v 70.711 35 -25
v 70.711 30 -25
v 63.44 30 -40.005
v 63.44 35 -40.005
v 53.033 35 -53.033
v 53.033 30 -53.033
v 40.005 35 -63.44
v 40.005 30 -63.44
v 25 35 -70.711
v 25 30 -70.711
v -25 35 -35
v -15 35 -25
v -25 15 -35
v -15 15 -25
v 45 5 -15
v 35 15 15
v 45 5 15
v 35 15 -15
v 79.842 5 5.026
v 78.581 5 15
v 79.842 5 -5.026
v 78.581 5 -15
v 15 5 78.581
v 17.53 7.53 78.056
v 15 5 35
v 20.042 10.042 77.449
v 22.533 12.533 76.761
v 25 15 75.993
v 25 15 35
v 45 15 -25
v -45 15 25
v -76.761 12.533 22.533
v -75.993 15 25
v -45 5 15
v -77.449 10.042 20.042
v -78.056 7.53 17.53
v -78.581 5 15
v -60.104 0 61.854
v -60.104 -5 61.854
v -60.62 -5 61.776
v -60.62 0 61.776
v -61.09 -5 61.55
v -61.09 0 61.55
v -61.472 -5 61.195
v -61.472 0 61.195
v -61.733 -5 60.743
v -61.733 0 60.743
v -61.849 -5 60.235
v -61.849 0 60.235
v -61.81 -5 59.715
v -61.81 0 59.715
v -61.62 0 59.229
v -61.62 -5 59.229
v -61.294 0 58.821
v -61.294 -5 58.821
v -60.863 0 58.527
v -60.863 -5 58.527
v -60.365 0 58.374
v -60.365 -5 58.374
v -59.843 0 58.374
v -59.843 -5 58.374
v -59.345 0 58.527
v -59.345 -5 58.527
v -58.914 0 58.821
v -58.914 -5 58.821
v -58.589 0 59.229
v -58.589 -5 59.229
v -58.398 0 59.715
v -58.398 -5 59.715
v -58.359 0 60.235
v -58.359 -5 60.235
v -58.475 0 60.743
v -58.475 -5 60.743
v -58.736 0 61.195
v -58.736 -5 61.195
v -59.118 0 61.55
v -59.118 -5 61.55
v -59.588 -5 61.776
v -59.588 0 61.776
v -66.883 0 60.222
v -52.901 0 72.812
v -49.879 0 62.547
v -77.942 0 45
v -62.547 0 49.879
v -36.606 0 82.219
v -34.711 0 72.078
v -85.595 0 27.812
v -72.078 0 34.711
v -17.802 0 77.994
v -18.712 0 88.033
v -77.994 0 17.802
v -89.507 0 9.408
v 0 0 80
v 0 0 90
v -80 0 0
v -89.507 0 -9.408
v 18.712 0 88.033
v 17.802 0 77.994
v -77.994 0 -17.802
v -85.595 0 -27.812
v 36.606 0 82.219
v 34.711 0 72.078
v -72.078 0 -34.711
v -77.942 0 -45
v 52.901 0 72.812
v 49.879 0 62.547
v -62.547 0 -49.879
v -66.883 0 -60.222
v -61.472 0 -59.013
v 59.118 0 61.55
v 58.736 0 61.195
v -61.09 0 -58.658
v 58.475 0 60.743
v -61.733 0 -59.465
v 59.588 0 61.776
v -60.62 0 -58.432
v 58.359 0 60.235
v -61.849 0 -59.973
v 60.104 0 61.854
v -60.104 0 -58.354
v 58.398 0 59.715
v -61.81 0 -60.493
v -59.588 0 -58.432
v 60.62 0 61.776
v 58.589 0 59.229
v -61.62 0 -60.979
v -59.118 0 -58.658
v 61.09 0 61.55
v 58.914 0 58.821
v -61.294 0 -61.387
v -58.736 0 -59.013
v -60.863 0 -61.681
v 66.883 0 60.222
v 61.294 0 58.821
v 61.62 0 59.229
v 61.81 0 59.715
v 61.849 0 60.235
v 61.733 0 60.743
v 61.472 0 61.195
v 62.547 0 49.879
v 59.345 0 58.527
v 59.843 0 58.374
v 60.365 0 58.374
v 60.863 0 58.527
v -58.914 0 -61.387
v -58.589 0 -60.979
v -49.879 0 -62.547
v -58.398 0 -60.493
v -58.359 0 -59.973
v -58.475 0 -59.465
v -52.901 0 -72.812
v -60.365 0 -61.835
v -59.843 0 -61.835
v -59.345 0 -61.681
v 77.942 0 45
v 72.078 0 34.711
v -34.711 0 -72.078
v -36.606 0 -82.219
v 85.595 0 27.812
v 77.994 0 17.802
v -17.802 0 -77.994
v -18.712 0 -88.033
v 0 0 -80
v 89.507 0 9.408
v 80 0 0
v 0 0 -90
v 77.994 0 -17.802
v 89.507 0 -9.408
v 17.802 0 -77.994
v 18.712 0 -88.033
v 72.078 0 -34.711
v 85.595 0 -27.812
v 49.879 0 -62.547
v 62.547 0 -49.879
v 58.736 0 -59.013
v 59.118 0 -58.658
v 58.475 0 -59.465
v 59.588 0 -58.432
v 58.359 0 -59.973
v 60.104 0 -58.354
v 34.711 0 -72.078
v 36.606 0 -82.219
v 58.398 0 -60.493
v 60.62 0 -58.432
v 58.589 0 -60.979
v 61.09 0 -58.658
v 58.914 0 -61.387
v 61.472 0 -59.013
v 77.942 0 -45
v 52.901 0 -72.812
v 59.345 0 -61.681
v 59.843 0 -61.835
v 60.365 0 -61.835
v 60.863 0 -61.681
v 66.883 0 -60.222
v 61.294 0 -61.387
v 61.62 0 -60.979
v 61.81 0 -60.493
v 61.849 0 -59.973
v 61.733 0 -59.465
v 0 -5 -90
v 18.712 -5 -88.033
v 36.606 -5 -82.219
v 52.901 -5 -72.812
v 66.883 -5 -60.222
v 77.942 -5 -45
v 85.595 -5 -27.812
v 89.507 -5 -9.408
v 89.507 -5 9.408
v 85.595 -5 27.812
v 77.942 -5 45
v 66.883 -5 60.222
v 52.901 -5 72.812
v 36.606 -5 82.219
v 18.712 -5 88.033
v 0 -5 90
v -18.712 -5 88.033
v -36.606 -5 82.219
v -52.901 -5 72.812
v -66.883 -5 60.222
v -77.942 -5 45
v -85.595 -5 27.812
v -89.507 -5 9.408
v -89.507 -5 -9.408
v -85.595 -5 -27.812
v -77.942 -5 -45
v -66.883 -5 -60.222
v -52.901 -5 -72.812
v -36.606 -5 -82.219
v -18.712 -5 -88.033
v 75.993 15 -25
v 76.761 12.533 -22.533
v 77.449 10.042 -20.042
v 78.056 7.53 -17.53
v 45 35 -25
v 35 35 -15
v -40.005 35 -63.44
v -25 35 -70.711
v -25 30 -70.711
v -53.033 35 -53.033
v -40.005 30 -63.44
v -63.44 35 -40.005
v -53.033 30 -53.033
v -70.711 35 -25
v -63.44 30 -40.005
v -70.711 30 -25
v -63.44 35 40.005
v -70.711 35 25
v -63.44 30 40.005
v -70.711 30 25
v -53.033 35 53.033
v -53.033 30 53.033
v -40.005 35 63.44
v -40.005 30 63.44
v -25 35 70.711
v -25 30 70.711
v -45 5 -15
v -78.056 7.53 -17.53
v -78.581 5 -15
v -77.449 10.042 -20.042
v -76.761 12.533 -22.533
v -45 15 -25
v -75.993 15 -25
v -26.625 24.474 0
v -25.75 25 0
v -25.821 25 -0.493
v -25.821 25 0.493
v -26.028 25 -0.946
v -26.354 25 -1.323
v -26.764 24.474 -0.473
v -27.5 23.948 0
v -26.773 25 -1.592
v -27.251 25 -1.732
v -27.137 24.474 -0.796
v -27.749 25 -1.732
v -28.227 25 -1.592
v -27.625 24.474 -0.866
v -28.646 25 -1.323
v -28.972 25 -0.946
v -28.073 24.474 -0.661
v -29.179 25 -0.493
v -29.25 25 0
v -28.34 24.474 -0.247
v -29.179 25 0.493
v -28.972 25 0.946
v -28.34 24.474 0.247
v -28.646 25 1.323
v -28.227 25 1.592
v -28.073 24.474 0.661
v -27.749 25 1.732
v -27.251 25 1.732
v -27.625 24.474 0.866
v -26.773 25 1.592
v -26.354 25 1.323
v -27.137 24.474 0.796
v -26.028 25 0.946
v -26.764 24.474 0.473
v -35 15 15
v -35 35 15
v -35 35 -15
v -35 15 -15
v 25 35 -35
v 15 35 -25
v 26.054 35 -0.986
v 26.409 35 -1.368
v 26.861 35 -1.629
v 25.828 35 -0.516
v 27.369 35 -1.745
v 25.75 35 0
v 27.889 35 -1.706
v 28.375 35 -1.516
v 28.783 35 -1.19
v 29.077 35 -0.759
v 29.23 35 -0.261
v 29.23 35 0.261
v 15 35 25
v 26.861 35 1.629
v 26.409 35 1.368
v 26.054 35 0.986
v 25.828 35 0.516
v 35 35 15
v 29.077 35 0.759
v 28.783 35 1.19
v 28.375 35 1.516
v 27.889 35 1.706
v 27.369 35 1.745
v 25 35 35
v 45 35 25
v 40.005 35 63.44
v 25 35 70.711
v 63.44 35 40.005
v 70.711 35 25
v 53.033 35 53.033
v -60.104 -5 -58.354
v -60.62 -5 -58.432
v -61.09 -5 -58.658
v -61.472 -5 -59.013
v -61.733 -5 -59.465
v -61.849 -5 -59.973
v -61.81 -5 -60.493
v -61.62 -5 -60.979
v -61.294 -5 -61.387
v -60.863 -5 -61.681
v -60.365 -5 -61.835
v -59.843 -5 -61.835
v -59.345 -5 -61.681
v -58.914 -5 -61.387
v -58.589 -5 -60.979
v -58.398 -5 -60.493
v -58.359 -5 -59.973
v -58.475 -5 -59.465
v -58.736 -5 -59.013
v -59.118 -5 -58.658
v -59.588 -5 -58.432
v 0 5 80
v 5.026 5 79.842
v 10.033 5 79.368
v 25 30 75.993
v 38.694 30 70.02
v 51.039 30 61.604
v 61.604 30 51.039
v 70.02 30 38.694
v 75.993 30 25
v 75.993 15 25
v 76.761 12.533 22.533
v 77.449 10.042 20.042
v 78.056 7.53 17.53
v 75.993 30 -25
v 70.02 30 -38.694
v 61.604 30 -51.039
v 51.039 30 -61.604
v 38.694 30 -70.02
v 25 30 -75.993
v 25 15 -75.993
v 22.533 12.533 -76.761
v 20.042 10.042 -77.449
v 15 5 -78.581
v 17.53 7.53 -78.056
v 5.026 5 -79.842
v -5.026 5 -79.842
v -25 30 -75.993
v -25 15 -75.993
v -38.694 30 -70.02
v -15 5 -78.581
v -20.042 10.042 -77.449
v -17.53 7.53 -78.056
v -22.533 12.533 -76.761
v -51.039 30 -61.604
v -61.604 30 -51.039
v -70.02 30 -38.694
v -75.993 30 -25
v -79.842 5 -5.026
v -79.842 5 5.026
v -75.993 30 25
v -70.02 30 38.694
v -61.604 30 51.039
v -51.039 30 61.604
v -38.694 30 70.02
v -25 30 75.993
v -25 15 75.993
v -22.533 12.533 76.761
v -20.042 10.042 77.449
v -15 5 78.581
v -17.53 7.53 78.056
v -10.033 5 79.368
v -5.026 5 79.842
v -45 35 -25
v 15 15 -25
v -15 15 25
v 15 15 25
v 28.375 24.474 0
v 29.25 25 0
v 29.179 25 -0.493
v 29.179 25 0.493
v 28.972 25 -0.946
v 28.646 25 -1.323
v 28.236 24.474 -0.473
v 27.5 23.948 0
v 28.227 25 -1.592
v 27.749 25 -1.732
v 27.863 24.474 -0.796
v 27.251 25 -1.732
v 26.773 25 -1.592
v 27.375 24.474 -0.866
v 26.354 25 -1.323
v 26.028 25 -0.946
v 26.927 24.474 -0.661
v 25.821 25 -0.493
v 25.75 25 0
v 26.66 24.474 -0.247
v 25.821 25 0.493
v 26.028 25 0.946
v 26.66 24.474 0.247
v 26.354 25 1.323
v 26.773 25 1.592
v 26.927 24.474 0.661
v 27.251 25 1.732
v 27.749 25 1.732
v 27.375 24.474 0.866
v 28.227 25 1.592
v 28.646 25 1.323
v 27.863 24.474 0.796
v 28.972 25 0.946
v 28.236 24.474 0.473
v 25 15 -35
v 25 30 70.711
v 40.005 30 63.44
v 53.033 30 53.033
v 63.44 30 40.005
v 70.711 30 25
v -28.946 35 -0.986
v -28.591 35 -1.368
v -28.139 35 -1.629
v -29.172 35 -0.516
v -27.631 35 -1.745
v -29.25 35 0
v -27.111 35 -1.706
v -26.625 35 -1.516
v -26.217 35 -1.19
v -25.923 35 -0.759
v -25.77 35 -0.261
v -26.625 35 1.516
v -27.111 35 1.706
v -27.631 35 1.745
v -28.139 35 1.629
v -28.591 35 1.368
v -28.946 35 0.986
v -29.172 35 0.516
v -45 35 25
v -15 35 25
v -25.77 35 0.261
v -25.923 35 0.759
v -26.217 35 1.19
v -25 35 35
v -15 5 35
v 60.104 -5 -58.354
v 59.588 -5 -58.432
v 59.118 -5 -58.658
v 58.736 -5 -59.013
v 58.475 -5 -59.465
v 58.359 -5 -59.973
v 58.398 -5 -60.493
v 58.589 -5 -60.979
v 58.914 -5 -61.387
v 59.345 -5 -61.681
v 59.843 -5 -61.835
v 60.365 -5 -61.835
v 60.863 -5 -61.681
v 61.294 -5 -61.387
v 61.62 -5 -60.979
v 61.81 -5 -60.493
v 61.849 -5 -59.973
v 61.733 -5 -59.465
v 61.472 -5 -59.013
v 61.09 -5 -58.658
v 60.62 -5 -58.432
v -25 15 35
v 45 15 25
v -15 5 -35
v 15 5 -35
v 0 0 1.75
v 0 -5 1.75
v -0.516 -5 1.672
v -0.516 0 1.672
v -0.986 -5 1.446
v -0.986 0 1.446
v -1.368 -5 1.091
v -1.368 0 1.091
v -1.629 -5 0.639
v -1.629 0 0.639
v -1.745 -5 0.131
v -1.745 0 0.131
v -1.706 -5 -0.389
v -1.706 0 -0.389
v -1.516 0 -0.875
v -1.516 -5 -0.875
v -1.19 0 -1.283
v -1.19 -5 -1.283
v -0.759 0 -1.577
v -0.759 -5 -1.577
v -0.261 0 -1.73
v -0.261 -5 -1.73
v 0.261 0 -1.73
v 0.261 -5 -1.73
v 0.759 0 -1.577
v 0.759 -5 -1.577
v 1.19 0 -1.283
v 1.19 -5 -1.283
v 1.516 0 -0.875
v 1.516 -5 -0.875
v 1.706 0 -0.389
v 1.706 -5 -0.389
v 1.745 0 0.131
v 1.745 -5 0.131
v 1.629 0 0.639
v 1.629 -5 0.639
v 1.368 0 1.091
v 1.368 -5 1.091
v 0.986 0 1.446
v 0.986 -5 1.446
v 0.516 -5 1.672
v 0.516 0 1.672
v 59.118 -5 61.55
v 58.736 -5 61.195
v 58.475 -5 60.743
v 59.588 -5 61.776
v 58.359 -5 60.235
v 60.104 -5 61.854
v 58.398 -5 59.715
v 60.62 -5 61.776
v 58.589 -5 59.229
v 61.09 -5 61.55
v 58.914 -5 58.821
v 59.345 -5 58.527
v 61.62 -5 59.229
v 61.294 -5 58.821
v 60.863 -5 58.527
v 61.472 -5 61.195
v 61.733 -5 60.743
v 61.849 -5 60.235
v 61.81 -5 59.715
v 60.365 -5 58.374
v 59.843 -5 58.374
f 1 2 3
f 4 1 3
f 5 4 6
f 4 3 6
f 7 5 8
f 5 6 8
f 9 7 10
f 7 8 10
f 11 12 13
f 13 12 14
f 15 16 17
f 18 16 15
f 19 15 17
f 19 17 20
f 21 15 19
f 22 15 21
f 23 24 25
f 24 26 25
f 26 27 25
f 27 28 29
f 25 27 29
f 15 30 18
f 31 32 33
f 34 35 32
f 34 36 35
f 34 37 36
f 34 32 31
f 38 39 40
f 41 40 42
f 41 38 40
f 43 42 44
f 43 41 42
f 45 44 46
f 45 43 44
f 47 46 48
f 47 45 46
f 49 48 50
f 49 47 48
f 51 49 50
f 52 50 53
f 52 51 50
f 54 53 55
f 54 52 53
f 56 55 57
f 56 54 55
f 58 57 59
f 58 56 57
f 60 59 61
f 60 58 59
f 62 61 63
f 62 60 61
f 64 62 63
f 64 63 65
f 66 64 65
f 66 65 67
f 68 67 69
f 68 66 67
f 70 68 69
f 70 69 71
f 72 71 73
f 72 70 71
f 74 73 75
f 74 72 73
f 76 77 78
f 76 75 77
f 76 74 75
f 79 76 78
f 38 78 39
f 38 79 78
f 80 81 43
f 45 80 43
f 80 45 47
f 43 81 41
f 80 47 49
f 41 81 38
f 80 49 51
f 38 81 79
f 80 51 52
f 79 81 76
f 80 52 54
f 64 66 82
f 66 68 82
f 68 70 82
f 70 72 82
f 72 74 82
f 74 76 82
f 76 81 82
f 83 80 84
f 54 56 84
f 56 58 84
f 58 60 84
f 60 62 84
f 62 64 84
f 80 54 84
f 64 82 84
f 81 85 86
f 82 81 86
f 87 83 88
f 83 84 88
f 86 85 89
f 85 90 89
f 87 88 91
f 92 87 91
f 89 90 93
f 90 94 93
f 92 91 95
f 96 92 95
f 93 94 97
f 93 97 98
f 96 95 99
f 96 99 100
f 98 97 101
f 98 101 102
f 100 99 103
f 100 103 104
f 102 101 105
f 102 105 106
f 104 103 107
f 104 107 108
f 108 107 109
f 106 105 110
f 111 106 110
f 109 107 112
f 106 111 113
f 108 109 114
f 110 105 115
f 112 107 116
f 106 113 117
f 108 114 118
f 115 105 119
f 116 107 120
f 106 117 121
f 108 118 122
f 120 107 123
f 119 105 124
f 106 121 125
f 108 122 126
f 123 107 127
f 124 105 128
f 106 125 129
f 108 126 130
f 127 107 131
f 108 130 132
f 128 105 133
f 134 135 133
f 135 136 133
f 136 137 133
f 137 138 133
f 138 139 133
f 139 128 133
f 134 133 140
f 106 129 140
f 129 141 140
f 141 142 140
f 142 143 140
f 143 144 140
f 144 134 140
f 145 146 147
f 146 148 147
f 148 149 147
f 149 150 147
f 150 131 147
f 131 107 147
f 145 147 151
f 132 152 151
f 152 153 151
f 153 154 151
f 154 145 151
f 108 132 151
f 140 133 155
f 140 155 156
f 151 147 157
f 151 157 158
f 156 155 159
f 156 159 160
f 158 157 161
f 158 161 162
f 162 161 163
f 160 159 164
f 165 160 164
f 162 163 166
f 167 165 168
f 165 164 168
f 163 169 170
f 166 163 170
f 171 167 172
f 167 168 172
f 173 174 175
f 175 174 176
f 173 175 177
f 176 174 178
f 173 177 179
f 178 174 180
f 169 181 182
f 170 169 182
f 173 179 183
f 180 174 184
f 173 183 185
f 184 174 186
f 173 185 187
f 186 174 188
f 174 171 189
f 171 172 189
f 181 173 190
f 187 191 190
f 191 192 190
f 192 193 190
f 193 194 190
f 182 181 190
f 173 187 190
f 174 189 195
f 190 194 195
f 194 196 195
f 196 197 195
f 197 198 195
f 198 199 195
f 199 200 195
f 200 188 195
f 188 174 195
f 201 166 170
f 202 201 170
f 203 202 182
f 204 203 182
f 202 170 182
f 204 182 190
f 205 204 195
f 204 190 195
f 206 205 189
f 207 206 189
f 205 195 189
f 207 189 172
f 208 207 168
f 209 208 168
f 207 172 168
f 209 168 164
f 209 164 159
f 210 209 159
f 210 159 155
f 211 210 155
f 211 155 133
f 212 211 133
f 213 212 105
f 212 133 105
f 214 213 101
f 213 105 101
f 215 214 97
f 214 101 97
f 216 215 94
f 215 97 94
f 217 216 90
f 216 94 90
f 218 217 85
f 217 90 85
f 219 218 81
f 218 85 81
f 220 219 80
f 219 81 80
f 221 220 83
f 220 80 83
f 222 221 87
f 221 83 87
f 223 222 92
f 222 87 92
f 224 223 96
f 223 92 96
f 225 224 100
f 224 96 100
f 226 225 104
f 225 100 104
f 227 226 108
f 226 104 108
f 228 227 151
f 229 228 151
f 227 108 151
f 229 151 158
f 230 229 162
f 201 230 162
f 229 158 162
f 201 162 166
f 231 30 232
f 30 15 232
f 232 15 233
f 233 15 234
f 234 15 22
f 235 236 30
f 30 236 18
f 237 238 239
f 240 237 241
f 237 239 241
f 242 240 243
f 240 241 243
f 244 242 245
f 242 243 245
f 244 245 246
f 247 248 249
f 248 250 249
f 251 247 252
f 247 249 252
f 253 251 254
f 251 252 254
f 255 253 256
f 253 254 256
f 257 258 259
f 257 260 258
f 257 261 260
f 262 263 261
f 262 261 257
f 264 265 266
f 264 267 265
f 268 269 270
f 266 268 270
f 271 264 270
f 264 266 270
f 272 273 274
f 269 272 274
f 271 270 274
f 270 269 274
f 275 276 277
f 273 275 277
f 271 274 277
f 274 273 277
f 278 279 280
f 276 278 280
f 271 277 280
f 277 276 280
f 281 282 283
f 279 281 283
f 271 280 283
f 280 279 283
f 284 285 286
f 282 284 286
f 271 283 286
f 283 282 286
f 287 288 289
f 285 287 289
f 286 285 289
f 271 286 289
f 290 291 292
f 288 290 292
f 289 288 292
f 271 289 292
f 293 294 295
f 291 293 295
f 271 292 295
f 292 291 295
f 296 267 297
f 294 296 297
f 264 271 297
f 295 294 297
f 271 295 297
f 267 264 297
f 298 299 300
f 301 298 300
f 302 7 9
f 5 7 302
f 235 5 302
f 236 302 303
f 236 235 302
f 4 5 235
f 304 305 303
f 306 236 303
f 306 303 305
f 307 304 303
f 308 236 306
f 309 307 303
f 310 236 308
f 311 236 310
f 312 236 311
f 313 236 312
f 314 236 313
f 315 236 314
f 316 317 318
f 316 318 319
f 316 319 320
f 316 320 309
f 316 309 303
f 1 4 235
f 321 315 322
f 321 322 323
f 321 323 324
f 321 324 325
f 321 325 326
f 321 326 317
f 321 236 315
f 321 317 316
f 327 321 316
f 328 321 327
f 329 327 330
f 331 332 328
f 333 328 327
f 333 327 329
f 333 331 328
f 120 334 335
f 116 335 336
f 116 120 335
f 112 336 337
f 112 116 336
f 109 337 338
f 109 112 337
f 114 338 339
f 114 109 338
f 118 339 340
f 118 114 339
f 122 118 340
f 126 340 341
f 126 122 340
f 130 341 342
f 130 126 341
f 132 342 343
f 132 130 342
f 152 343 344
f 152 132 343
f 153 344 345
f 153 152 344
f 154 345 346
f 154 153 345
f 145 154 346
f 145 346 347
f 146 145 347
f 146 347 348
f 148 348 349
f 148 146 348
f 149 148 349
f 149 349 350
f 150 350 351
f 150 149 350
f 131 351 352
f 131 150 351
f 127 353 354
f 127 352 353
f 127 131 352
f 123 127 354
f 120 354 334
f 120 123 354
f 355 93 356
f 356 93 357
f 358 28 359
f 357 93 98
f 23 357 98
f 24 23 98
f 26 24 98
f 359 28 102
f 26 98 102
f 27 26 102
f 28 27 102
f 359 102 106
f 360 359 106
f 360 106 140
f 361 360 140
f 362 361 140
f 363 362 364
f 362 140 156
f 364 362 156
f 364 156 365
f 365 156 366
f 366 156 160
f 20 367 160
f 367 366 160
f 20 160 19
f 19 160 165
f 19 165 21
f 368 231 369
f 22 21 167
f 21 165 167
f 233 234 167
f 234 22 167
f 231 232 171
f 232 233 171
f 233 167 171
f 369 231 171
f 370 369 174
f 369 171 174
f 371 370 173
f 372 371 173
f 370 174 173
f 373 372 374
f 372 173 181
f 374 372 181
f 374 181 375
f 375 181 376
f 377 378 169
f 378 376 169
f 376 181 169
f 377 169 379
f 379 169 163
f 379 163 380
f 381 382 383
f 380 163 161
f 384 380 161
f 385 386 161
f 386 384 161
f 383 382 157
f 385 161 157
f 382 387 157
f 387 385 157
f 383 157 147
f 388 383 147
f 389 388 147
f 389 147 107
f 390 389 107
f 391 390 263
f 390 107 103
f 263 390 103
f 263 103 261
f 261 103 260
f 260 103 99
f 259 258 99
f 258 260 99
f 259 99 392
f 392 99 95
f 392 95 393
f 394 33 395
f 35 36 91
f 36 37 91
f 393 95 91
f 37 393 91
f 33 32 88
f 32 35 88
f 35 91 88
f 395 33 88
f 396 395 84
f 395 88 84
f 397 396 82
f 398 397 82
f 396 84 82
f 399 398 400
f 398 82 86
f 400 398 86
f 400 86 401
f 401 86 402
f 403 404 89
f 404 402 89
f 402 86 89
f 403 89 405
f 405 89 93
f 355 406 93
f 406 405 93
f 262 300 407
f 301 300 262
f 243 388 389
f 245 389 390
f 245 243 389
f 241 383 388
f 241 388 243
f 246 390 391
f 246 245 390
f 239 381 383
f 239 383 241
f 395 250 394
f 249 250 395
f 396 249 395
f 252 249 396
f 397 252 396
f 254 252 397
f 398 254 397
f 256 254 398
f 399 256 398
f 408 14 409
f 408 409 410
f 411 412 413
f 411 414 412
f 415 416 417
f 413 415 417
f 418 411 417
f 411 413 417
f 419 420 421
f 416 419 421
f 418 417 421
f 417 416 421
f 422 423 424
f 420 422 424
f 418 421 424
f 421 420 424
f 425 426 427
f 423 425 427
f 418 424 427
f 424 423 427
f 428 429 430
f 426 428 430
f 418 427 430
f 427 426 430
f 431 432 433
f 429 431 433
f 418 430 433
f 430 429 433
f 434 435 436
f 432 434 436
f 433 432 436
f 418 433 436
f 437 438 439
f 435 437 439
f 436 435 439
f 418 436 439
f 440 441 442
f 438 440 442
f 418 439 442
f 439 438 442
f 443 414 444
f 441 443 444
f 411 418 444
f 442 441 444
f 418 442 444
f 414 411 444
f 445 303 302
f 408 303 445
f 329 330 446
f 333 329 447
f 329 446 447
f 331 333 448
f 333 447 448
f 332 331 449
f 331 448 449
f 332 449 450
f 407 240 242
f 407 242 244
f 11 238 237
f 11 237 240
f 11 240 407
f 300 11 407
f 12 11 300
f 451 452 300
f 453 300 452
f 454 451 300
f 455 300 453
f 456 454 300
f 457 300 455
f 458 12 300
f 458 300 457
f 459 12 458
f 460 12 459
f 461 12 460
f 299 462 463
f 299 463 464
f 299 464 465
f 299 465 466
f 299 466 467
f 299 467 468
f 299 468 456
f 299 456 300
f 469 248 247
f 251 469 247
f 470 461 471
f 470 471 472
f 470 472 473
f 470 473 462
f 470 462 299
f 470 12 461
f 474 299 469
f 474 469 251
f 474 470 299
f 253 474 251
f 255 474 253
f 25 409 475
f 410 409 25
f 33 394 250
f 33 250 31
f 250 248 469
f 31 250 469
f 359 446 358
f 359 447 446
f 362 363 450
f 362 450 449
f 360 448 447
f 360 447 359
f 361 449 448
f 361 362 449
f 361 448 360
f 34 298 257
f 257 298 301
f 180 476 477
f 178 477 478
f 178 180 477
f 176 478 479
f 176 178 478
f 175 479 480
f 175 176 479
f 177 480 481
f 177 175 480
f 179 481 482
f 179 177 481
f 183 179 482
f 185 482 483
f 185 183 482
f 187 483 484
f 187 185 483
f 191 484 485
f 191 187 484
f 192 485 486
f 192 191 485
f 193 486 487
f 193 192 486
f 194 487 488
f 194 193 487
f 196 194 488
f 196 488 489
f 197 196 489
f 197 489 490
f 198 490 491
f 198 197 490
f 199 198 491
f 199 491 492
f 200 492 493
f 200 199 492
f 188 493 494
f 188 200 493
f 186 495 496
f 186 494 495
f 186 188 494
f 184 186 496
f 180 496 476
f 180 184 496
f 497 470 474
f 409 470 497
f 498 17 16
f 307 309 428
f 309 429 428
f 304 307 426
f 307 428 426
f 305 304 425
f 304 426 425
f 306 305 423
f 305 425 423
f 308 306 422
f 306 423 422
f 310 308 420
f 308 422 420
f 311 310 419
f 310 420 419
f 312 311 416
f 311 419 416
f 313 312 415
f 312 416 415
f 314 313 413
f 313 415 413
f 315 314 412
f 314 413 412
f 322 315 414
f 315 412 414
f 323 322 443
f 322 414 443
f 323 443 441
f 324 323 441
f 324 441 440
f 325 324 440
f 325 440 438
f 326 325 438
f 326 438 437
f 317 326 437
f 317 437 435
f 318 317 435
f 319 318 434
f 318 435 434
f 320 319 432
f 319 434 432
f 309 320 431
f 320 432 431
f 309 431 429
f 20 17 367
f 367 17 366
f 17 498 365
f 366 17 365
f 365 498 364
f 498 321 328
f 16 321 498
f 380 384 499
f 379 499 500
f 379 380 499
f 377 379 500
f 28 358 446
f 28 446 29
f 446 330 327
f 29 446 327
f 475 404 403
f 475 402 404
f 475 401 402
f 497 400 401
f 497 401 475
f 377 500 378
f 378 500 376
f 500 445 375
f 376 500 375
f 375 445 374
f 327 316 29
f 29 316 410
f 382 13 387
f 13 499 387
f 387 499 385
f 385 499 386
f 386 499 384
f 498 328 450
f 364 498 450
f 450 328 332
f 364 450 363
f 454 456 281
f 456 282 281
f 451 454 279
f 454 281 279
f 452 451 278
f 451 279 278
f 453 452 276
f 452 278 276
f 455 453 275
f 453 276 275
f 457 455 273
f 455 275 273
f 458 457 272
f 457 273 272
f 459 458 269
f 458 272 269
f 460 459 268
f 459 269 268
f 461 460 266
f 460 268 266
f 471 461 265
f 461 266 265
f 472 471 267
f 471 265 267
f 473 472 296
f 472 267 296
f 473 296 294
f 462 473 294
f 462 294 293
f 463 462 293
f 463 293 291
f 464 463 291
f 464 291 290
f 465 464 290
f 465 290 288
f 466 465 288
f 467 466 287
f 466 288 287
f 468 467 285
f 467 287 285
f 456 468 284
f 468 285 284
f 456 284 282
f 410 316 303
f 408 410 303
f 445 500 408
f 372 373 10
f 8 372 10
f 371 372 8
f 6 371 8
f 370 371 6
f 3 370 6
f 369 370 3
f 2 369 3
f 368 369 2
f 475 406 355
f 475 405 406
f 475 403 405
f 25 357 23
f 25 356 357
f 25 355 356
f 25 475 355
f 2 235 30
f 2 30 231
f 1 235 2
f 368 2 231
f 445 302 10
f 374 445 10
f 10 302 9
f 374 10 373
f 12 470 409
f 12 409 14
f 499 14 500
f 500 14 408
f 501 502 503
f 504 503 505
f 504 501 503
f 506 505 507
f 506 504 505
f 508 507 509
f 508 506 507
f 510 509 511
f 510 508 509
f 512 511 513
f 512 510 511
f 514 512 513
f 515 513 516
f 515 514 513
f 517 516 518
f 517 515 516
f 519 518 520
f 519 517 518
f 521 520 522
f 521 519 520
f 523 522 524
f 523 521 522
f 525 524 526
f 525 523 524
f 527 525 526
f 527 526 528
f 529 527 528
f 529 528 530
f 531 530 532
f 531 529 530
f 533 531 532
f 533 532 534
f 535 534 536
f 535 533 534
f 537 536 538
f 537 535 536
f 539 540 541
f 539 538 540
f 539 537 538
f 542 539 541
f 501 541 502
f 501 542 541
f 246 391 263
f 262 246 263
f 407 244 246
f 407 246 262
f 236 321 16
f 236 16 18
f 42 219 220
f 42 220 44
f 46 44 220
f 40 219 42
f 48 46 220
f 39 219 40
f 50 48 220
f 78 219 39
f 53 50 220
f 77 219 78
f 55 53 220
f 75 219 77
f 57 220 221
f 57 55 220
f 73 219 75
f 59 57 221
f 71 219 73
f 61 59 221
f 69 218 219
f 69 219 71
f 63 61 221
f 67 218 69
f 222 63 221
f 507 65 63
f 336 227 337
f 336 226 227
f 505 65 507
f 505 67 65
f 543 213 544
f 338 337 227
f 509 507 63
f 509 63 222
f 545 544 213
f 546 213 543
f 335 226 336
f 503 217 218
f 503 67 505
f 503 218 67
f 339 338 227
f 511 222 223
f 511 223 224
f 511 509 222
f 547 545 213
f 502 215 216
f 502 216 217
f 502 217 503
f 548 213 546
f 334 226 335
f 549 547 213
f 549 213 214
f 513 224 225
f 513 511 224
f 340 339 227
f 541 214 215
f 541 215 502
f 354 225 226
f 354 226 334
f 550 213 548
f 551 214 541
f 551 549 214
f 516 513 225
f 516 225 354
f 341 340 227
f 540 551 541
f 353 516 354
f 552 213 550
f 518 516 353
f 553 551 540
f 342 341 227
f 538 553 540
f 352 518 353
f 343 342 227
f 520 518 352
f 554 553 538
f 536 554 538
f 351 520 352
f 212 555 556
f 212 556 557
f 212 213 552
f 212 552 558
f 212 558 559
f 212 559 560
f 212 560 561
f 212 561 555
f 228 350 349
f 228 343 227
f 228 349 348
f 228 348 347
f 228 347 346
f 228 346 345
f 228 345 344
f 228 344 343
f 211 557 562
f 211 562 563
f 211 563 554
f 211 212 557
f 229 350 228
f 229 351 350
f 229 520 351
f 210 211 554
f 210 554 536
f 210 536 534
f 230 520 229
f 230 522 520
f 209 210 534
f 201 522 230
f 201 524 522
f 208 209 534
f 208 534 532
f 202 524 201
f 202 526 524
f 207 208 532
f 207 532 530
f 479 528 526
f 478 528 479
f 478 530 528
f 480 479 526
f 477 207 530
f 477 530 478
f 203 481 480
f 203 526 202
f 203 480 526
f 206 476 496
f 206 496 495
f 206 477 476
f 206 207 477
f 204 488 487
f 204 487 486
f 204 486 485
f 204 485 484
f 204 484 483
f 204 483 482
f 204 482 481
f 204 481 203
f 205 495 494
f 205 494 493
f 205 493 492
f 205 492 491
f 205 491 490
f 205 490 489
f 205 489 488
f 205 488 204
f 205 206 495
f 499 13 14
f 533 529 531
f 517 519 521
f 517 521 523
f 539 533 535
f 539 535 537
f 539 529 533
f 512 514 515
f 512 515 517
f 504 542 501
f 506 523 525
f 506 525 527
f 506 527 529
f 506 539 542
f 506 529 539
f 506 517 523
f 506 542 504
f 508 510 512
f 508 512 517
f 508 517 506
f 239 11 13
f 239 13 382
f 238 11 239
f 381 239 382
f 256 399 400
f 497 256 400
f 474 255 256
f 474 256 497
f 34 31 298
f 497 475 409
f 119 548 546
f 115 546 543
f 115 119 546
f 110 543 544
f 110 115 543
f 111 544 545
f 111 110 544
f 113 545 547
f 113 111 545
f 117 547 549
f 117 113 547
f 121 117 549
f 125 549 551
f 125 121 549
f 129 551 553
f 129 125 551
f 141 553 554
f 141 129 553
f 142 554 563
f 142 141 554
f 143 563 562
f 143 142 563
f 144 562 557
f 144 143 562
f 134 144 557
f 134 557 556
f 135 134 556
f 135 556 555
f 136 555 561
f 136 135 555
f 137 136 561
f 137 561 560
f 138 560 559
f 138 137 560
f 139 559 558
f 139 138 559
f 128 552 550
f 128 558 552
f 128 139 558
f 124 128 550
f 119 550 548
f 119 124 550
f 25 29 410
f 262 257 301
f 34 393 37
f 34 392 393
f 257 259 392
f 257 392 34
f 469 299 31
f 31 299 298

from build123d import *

# Parameters (mm, degrees)
SKETCH1_R                           = 80
BOSS_EXTRUDE1_DEPTH                 = 30
SKETCH2_R                           = 90
BOSS_EXTRUDE2_DEPTH                 = 5
SKETCH6_R                           = 75
BOSS_EXTRUDE3_DEPTH                 = 5
F_3_5_3_5_DIAMETER_HOLE1_D          = 3.5
F_3_5_3_5_DIAMETER_HOLE1_DEPTH      = 10
F_3_5_3_5_DIAMETER_HOLE1_TIP        = 1.051506083
SKETCH7_W                           = 50
SKETCH7_H                           = 110
CUT_EXTRUDE1_DEPTH                  = 30
CHAMFER1_SIZE                       = 10
SKETCH8_W                           = 30
SKETCH8_H                           = 50
CUT_EXTRUDE2_DEPTH                  = 20
F_3_5_3_5_DIAMETER_HOLE2_AT_2_COUNT = 2
F_3_5_3_5_DIAMETER_HOLE2_AT_2_PITCH = 85
F_3_5_3_5_DIAMETER_HOLE2_AT_3_COUNT = 2
F_3_5_3_5_DIAMETER_HOLE2_AT_3_PITCH = 85
F_3_5_3_5_DIAMETER_HOLE2_AT_4_COUNT = 2
F_3_5_3_5_DIAMETER_HOLE2_AT_4_PITCH = 85
F_3_5_3_5_DIAMETER_HOLE2_AT_5_COUNT = 2
F_3_5_3_5_DIAMETER_HOLE2_AT_5_PITCH = 85
SKETCH11_W                          = 80
SKETCH11_H                          = 50
CUT_EXTRUDE3_DEPTH                  = 30
CHAMFER2_SIZE                       = 10


with BuildPart() as part:
    # Sketch1 → Boss-Extrude1 (new body)
    with BuildSketch(Plane(origin=(0, 0, 0), x_dir=(1, 0, 0), z_dir=(0, 1, 0))):
        with Locations(Location((0, 0, 0), (0, 0, 270))):
            Circle(SKETCH1_R)
    extrude(amount=BOSS_EXTRUDE1_DEPTH)

    # Sketch2 → Boss-Extrude2 (add)
    with BuildSketch(Plane.XZ):
        with Locations(Location((0, 0, 0), (0, 0, 270))):
            Circle(SKETCH2_R)
    extrude(amount=BOSS_EXTRUDE2_DEPTH)

    # Sketch6 → Boss-Extrude3 (add)
    with BuildSketch(Plane(origin=(0, 30, 0), x_dir=(1, 0, 0), z_dir=(0, 1, 0))):
        with Locations(Location((0, 0, 0), (0, 0, 270))):
            Circle(SKETCH6_R)
    extrude(amount=BOSS_EXTRUDE3_DEPTH)

    # Ø3.5 (3.5) Diameter Hole1
    with Locations(Plane(origin=(-12.746034072, 35, -7.868896946), x_dir=(1, 0, 0), z_dir=(0, 1, 0))):
        with Locations((-14.753965928, -7.868896946), (40.246034072, -7.868896946)):
            Hole(F_3_5_3_5_DIAMETER_HOLE1_D / 2, depth=F_3_5_3_5_DIAMETER_HOLE1_DEPTH)
            with Locations((0, 0, -(F_3_5_3_5_DIAMETER_HOLE1_DEPTH + F_3_5_3_5_DIAMETER_HOLE1_TIP / 2))):  # 118° drill point
                Cone(0, F_3_5_3_5_DIAMETER_HOLE1_D / 2, F_3_5_3_5_DIAMETER_HOLE1_TIP, mode=Mode.SUBTRACT)

    # Sketch7 → Cut-Extrude1 (cut)
    with BuildSketch(Plane(origin=(0, 35, 0), x_dir=(1, 0, 0), z_dir=(0, 1, 0))):
        with Locations((0, 80)):
            Rectangle(SKETCH7_W, SKETCH7_H)
        with Locations((0, -80)):
            Rectangle(SKETCH7_W, SKETCH7_H)
    extrude(amount=-CUT_EXTRUDE1_DEPTH, mode=Mode.SUBTRACT)

    # Chamfer1
    chamfer1_edges = [part.edges().sort_by_distance(p)[0] for p in [
        (25, 5, -50.496710384),
        (-25, 5, -50.496710384),
        (-25, 20, -25),
        (0, 5, -25),
        (25, 20, -25),
        (25, 5, 50.496710384),
        (25, 20, 25),
        (-25, 5, 50.496710384),
        (0, 5, 25),
        (-25, 20, 25),
    ]]
    chamfer(chamfer1_edges, length=CHAMFER1_SIZE)

    # Sketch8 → Cut-Extrude2 (cut)
    with BuildSketch(Plane(origin=(0, 35, 0), x_dir=(1, 0, 0), z_dir=(0, 1, 0))):
        Rectangle(SKETCH8_W, SKETCH8_H)
    extrude(amount=-CUT_EXTRUDE2_DEPTH, mode=Mode.SUBTRACT)

    # Sketch9 → Ø3.5 (3.5) Diameter Hole2 (revolve, cut)
    with BuildSketch(Plane(origin=(0, 0, 0), x_dir=(0, 0, 1), z_dir=(1, 0, 0))):
        Polygon((0, 0), (0, 11.051506083), (1.75, 10), (1.75, 0), align=None)
    f_3_5_3_5_diameter_hole2 = revolve(axis=Axis((0, 6.35, 0), (0, -1, 0)), mode=Mode.SUBTRACT)

    # Ø3.5 (3.5) Diameter Hole2 at 2: Ø3.5 (3.5) Diameter Hole2 ×2
    with Locations(*[Vector(0.7071067811865478, 0, 0.7071067811865475) * (i * F_3_5_3_5_DIAMETER_HOLE2_AT_2_PITCH) for i in range(1, F_3_5_3_5_DIAMETER_HOLE2_AT_2_COUNT)]):
        add(f_3_5_3_5_diameter_hole2, mode=Mode.SUBTRACT)

    # Ø3.5 (3.5) Diameter Hole2 at 3: Ø3.5 (3.5) Diameter Hole2 ×2
    with Locations(*[Vector(-0.7071067811865477, 0, -0.7071067811865475) * (i * F_3_5_3_5_DIAMETER_HOLE2_AT_3_PITCH) for i in range(1, F_3_5_3_5_DIAMETER_HOLE2_AT_3_COUNT)]):
        add(f_3_5_3_5_diameter_hole2, mode=Mode.SUBTRACT)

    # Ø3.5 (3.5) Diameter Hole2 at 4: Ø3.5 (3.5) Diameter Hole2 ×2
    with Locations(*[Vector(-0.7071067811865476, 0, 0.7071067811865476) * (i * F_3_5_3_5_DIAMETER_HOLE2_AT_4_PITCH) for i in range(1, F_3_5_3_5_DIAMETER_HOLE2_AT_4_COUNT)]):
        add(f_3_5_3_5_diameter_hole2, mode=Mode.SUBTRACT)

    # Ø3.5 (3.5) Diameter Hole2 at 5: Ø3.5 (3.5) Diameter Hole2 ×2
    with Locations(*[Vector(0.7071067811865476, 0, -0.7071067811865476) * (i * F_3_5_3_5_DIAMETER_HOLE2_AT_5_PITCH) for i in range(1, F_3_5_3_5_DIAMETER_HOLE2_AT_5_COUNT)]):
        add(f_3_5_3_5_diameter_hole2, mode=Mode.SUBTRACT)

    # Sketch11 → Cut-Extrude3 (cut)
    with BuildSketch(Plane(origin=(0, 35, 0), x_dir=(1, 0, 0), z_dir=(0, 1, 0))):
        with Locations((75, 0)):
            Rectangle(SKETCH11_W, SKETCH11_H)
        with Locations((-75, 0)):
            Rectangle(SKETCH11_W, SKETCH11_H)
    extrude(amount=-CUT_EXTRUDE3_DEPTH, mode=Mode.SUBTRACT)

    # Chamfer2
    chamfer2_edges = [part.edges().sort_by_distance(p)[0] for p in [
        (55.496710384, 5, -25),
        (35, 20, -25),
        (55.496710384, 5, 25),
        (35, 5, 0),
        (35, 20, 25),
        (-55.496710384, 5, -25),
        (-55.496710384, 5, 25),
        (-35, 20, 25),
        (-35, 5, 0),
        (-35, 20, -25),
    ]]
    chamfer(chamfer2_edges, length=CHAMFER2_SIZE)


solid = part.part
